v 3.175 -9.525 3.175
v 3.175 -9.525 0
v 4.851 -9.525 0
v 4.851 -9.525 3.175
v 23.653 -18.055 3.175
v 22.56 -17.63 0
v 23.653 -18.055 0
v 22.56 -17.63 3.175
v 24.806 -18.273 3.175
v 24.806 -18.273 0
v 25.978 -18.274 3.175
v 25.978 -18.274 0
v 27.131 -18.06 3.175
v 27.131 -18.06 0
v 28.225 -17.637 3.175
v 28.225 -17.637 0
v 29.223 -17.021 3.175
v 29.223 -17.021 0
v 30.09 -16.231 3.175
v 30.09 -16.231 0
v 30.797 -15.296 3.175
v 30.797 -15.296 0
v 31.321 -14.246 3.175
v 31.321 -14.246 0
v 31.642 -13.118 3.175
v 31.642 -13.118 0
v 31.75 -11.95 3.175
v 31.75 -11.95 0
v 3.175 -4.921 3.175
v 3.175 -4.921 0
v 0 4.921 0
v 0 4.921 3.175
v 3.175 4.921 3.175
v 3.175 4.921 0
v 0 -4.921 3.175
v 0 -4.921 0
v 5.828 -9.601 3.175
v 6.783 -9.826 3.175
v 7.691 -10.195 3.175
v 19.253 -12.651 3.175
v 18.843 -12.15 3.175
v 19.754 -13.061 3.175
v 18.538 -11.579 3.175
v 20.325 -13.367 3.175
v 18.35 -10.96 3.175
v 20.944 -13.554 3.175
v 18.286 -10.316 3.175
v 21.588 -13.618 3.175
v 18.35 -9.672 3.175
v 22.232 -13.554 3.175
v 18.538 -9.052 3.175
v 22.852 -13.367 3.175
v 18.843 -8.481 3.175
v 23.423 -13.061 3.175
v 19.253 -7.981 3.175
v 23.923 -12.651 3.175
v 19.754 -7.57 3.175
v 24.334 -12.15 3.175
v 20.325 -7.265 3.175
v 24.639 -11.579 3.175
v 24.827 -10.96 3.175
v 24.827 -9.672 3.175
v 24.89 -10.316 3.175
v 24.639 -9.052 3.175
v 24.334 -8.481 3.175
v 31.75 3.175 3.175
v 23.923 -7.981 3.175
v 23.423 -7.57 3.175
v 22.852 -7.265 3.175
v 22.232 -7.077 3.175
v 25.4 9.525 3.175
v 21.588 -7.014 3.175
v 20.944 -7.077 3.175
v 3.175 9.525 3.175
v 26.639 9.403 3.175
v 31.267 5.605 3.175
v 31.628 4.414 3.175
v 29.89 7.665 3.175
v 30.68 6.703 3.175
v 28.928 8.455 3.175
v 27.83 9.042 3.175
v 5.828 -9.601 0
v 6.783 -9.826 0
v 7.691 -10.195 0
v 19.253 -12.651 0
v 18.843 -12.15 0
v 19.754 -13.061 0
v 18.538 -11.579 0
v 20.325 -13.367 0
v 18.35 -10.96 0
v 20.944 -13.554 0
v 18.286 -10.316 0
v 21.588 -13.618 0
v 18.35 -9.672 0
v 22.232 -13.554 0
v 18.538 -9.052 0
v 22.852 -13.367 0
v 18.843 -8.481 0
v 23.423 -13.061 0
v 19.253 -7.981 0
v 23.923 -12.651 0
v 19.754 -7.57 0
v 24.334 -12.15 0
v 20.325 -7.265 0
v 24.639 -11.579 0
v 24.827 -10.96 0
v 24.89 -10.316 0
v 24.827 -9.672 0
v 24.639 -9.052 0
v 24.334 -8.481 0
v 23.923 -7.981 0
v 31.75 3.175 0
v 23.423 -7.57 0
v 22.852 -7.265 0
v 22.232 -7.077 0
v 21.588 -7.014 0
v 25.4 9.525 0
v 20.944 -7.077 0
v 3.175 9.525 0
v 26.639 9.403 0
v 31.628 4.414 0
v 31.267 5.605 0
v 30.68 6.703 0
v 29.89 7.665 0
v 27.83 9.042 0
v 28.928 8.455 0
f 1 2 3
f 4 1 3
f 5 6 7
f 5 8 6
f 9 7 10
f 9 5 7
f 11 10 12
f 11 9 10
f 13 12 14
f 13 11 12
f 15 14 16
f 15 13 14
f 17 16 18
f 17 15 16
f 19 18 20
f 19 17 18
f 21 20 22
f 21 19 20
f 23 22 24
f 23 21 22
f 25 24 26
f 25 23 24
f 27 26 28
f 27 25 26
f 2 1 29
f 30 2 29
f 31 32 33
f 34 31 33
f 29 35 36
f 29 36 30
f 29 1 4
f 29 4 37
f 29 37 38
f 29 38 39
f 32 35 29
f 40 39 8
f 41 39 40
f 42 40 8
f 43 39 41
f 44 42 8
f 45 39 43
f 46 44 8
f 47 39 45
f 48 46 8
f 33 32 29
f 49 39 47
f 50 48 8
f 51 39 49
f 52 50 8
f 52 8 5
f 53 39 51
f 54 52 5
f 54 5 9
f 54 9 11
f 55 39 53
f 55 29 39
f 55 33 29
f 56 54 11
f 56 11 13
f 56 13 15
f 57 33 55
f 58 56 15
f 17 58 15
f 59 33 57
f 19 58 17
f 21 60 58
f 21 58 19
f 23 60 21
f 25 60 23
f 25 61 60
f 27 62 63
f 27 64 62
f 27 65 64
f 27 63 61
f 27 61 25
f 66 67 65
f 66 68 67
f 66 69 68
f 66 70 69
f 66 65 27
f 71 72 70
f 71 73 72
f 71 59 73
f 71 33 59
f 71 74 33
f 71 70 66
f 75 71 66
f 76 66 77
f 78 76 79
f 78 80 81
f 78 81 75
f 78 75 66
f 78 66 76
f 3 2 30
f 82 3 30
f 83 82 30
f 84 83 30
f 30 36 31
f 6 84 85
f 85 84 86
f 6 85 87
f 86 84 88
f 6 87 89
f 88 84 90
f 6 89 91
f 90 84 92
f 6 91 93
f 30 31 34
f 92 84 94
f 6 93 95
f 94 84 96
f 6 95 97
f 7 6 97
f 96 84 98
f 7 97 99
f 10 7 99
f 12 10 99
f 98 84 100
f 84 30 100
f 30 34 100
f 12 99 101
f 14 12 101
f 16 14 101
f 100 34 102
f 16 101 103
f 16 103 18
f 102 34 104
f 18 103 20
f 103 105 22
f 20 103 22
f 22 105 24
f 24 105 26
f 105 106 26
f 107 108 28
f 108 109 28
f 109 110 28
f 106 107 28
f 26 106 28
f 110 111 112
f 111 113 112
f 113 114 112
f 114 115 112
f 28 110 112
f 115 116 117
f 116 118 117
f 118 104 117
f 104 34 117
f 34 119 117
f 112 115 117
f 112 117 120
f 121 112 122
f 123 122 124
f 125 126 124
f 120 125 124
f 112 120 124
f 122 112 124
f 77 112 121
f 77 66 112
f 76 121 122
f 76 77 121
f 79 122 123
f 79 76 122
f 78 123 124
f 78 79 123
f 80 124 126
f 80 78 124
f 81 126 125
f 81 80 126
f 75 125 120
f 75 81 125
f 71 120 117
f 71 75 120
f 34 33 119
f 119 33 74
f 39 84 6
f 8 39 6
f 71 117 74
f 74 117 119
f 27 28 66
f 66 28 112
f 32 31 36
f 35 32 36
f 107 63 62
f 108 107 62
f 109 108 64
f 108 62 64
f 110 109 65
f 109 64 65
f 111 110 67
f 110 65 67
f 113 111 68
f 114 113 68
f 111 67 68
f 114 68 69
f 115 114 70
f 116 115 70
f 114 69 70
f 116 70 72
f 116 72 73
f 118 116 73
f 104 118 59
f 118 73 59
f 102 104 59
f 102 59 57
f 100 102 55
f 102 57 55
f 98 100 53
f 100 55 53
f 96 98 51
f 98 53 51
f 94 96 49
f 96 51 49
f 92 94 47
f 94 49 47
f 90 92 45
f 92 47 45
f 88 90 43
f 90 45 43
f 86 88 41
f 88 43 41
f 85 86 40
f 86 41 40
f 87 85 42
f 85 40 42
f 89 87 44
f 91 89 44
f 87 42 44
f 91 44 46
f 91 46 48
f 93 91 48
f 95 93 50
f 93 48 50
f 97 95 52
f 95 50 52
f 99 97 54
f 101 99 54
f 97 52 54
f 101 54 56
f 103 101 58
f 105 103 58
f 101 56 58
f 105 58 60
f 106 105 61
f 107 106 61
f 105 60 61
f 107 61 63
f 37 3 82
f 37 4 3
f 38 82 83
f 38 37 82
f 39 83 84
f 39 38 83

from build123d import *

# Parameters (mm, degrees)
BOSS_EXTRUDE1_DEPTH = 3.175
FILLET1_R           = 6.35
SKETCH3_R           = 3.302
CUT_EXTRUDE1_DEPTH  = 3.175
SKETCH4_W           = 3.175
SKETCH4_H           = 4.60375
CUT_EXTRUDE2_DEPTH  = 3.175


with BuildPart() as part:
    # Sketch1 → Boss-Extrude1 (new body)
    with BuildSketch(Plane.XY):
        Polygon((0, -9.525), (6.35, -9.525), (31.75, -22.225), (31.75, 9.525), (0, 9.525), align=None)
    extrude(amount=BOSS_EXTRUDE1_DEPTH)

    # Fillet1
    fillet1_edges = [part.edges().sort_by_distance(p)[0] for p in [
        (31.75, 9.525, 1.5875),
        (31.75, -22.225, 1.5875),
        (6.35, -9.525, 1.5875),
    ]]
    fillet(fillet1_edges, radius=FILLET1_R)

    # Sketch3 → Cut-Extrude1 (cut)
    with BuildSketch(Plane.XY.offset(3.175)):
        with Locations((21.588299978, -10.315871599)):
            Circle(SKETCH3_R)
    extrude(amount=-CUT_EXTRUDE1_DEPTH, mode=Mode.SUBTRACT)

    # Sketch4 → Cut-Extrude2 (cut)
    with BuildSketch(Plane.XY.offset(3.175)):
        with Locations((1.5875, 7.223125)):
            Rectangle(SKETCH4_W, SKETCH4_H)
        with Locations((1.5875, -7.223125)):
            Rectangle(SKETCH4_W, SKETCH4_H)
    extrude(amount=-CUT_EXTRUDE2_DEPTH, mode=Mode.SUBTRACT)


solid = part.part
